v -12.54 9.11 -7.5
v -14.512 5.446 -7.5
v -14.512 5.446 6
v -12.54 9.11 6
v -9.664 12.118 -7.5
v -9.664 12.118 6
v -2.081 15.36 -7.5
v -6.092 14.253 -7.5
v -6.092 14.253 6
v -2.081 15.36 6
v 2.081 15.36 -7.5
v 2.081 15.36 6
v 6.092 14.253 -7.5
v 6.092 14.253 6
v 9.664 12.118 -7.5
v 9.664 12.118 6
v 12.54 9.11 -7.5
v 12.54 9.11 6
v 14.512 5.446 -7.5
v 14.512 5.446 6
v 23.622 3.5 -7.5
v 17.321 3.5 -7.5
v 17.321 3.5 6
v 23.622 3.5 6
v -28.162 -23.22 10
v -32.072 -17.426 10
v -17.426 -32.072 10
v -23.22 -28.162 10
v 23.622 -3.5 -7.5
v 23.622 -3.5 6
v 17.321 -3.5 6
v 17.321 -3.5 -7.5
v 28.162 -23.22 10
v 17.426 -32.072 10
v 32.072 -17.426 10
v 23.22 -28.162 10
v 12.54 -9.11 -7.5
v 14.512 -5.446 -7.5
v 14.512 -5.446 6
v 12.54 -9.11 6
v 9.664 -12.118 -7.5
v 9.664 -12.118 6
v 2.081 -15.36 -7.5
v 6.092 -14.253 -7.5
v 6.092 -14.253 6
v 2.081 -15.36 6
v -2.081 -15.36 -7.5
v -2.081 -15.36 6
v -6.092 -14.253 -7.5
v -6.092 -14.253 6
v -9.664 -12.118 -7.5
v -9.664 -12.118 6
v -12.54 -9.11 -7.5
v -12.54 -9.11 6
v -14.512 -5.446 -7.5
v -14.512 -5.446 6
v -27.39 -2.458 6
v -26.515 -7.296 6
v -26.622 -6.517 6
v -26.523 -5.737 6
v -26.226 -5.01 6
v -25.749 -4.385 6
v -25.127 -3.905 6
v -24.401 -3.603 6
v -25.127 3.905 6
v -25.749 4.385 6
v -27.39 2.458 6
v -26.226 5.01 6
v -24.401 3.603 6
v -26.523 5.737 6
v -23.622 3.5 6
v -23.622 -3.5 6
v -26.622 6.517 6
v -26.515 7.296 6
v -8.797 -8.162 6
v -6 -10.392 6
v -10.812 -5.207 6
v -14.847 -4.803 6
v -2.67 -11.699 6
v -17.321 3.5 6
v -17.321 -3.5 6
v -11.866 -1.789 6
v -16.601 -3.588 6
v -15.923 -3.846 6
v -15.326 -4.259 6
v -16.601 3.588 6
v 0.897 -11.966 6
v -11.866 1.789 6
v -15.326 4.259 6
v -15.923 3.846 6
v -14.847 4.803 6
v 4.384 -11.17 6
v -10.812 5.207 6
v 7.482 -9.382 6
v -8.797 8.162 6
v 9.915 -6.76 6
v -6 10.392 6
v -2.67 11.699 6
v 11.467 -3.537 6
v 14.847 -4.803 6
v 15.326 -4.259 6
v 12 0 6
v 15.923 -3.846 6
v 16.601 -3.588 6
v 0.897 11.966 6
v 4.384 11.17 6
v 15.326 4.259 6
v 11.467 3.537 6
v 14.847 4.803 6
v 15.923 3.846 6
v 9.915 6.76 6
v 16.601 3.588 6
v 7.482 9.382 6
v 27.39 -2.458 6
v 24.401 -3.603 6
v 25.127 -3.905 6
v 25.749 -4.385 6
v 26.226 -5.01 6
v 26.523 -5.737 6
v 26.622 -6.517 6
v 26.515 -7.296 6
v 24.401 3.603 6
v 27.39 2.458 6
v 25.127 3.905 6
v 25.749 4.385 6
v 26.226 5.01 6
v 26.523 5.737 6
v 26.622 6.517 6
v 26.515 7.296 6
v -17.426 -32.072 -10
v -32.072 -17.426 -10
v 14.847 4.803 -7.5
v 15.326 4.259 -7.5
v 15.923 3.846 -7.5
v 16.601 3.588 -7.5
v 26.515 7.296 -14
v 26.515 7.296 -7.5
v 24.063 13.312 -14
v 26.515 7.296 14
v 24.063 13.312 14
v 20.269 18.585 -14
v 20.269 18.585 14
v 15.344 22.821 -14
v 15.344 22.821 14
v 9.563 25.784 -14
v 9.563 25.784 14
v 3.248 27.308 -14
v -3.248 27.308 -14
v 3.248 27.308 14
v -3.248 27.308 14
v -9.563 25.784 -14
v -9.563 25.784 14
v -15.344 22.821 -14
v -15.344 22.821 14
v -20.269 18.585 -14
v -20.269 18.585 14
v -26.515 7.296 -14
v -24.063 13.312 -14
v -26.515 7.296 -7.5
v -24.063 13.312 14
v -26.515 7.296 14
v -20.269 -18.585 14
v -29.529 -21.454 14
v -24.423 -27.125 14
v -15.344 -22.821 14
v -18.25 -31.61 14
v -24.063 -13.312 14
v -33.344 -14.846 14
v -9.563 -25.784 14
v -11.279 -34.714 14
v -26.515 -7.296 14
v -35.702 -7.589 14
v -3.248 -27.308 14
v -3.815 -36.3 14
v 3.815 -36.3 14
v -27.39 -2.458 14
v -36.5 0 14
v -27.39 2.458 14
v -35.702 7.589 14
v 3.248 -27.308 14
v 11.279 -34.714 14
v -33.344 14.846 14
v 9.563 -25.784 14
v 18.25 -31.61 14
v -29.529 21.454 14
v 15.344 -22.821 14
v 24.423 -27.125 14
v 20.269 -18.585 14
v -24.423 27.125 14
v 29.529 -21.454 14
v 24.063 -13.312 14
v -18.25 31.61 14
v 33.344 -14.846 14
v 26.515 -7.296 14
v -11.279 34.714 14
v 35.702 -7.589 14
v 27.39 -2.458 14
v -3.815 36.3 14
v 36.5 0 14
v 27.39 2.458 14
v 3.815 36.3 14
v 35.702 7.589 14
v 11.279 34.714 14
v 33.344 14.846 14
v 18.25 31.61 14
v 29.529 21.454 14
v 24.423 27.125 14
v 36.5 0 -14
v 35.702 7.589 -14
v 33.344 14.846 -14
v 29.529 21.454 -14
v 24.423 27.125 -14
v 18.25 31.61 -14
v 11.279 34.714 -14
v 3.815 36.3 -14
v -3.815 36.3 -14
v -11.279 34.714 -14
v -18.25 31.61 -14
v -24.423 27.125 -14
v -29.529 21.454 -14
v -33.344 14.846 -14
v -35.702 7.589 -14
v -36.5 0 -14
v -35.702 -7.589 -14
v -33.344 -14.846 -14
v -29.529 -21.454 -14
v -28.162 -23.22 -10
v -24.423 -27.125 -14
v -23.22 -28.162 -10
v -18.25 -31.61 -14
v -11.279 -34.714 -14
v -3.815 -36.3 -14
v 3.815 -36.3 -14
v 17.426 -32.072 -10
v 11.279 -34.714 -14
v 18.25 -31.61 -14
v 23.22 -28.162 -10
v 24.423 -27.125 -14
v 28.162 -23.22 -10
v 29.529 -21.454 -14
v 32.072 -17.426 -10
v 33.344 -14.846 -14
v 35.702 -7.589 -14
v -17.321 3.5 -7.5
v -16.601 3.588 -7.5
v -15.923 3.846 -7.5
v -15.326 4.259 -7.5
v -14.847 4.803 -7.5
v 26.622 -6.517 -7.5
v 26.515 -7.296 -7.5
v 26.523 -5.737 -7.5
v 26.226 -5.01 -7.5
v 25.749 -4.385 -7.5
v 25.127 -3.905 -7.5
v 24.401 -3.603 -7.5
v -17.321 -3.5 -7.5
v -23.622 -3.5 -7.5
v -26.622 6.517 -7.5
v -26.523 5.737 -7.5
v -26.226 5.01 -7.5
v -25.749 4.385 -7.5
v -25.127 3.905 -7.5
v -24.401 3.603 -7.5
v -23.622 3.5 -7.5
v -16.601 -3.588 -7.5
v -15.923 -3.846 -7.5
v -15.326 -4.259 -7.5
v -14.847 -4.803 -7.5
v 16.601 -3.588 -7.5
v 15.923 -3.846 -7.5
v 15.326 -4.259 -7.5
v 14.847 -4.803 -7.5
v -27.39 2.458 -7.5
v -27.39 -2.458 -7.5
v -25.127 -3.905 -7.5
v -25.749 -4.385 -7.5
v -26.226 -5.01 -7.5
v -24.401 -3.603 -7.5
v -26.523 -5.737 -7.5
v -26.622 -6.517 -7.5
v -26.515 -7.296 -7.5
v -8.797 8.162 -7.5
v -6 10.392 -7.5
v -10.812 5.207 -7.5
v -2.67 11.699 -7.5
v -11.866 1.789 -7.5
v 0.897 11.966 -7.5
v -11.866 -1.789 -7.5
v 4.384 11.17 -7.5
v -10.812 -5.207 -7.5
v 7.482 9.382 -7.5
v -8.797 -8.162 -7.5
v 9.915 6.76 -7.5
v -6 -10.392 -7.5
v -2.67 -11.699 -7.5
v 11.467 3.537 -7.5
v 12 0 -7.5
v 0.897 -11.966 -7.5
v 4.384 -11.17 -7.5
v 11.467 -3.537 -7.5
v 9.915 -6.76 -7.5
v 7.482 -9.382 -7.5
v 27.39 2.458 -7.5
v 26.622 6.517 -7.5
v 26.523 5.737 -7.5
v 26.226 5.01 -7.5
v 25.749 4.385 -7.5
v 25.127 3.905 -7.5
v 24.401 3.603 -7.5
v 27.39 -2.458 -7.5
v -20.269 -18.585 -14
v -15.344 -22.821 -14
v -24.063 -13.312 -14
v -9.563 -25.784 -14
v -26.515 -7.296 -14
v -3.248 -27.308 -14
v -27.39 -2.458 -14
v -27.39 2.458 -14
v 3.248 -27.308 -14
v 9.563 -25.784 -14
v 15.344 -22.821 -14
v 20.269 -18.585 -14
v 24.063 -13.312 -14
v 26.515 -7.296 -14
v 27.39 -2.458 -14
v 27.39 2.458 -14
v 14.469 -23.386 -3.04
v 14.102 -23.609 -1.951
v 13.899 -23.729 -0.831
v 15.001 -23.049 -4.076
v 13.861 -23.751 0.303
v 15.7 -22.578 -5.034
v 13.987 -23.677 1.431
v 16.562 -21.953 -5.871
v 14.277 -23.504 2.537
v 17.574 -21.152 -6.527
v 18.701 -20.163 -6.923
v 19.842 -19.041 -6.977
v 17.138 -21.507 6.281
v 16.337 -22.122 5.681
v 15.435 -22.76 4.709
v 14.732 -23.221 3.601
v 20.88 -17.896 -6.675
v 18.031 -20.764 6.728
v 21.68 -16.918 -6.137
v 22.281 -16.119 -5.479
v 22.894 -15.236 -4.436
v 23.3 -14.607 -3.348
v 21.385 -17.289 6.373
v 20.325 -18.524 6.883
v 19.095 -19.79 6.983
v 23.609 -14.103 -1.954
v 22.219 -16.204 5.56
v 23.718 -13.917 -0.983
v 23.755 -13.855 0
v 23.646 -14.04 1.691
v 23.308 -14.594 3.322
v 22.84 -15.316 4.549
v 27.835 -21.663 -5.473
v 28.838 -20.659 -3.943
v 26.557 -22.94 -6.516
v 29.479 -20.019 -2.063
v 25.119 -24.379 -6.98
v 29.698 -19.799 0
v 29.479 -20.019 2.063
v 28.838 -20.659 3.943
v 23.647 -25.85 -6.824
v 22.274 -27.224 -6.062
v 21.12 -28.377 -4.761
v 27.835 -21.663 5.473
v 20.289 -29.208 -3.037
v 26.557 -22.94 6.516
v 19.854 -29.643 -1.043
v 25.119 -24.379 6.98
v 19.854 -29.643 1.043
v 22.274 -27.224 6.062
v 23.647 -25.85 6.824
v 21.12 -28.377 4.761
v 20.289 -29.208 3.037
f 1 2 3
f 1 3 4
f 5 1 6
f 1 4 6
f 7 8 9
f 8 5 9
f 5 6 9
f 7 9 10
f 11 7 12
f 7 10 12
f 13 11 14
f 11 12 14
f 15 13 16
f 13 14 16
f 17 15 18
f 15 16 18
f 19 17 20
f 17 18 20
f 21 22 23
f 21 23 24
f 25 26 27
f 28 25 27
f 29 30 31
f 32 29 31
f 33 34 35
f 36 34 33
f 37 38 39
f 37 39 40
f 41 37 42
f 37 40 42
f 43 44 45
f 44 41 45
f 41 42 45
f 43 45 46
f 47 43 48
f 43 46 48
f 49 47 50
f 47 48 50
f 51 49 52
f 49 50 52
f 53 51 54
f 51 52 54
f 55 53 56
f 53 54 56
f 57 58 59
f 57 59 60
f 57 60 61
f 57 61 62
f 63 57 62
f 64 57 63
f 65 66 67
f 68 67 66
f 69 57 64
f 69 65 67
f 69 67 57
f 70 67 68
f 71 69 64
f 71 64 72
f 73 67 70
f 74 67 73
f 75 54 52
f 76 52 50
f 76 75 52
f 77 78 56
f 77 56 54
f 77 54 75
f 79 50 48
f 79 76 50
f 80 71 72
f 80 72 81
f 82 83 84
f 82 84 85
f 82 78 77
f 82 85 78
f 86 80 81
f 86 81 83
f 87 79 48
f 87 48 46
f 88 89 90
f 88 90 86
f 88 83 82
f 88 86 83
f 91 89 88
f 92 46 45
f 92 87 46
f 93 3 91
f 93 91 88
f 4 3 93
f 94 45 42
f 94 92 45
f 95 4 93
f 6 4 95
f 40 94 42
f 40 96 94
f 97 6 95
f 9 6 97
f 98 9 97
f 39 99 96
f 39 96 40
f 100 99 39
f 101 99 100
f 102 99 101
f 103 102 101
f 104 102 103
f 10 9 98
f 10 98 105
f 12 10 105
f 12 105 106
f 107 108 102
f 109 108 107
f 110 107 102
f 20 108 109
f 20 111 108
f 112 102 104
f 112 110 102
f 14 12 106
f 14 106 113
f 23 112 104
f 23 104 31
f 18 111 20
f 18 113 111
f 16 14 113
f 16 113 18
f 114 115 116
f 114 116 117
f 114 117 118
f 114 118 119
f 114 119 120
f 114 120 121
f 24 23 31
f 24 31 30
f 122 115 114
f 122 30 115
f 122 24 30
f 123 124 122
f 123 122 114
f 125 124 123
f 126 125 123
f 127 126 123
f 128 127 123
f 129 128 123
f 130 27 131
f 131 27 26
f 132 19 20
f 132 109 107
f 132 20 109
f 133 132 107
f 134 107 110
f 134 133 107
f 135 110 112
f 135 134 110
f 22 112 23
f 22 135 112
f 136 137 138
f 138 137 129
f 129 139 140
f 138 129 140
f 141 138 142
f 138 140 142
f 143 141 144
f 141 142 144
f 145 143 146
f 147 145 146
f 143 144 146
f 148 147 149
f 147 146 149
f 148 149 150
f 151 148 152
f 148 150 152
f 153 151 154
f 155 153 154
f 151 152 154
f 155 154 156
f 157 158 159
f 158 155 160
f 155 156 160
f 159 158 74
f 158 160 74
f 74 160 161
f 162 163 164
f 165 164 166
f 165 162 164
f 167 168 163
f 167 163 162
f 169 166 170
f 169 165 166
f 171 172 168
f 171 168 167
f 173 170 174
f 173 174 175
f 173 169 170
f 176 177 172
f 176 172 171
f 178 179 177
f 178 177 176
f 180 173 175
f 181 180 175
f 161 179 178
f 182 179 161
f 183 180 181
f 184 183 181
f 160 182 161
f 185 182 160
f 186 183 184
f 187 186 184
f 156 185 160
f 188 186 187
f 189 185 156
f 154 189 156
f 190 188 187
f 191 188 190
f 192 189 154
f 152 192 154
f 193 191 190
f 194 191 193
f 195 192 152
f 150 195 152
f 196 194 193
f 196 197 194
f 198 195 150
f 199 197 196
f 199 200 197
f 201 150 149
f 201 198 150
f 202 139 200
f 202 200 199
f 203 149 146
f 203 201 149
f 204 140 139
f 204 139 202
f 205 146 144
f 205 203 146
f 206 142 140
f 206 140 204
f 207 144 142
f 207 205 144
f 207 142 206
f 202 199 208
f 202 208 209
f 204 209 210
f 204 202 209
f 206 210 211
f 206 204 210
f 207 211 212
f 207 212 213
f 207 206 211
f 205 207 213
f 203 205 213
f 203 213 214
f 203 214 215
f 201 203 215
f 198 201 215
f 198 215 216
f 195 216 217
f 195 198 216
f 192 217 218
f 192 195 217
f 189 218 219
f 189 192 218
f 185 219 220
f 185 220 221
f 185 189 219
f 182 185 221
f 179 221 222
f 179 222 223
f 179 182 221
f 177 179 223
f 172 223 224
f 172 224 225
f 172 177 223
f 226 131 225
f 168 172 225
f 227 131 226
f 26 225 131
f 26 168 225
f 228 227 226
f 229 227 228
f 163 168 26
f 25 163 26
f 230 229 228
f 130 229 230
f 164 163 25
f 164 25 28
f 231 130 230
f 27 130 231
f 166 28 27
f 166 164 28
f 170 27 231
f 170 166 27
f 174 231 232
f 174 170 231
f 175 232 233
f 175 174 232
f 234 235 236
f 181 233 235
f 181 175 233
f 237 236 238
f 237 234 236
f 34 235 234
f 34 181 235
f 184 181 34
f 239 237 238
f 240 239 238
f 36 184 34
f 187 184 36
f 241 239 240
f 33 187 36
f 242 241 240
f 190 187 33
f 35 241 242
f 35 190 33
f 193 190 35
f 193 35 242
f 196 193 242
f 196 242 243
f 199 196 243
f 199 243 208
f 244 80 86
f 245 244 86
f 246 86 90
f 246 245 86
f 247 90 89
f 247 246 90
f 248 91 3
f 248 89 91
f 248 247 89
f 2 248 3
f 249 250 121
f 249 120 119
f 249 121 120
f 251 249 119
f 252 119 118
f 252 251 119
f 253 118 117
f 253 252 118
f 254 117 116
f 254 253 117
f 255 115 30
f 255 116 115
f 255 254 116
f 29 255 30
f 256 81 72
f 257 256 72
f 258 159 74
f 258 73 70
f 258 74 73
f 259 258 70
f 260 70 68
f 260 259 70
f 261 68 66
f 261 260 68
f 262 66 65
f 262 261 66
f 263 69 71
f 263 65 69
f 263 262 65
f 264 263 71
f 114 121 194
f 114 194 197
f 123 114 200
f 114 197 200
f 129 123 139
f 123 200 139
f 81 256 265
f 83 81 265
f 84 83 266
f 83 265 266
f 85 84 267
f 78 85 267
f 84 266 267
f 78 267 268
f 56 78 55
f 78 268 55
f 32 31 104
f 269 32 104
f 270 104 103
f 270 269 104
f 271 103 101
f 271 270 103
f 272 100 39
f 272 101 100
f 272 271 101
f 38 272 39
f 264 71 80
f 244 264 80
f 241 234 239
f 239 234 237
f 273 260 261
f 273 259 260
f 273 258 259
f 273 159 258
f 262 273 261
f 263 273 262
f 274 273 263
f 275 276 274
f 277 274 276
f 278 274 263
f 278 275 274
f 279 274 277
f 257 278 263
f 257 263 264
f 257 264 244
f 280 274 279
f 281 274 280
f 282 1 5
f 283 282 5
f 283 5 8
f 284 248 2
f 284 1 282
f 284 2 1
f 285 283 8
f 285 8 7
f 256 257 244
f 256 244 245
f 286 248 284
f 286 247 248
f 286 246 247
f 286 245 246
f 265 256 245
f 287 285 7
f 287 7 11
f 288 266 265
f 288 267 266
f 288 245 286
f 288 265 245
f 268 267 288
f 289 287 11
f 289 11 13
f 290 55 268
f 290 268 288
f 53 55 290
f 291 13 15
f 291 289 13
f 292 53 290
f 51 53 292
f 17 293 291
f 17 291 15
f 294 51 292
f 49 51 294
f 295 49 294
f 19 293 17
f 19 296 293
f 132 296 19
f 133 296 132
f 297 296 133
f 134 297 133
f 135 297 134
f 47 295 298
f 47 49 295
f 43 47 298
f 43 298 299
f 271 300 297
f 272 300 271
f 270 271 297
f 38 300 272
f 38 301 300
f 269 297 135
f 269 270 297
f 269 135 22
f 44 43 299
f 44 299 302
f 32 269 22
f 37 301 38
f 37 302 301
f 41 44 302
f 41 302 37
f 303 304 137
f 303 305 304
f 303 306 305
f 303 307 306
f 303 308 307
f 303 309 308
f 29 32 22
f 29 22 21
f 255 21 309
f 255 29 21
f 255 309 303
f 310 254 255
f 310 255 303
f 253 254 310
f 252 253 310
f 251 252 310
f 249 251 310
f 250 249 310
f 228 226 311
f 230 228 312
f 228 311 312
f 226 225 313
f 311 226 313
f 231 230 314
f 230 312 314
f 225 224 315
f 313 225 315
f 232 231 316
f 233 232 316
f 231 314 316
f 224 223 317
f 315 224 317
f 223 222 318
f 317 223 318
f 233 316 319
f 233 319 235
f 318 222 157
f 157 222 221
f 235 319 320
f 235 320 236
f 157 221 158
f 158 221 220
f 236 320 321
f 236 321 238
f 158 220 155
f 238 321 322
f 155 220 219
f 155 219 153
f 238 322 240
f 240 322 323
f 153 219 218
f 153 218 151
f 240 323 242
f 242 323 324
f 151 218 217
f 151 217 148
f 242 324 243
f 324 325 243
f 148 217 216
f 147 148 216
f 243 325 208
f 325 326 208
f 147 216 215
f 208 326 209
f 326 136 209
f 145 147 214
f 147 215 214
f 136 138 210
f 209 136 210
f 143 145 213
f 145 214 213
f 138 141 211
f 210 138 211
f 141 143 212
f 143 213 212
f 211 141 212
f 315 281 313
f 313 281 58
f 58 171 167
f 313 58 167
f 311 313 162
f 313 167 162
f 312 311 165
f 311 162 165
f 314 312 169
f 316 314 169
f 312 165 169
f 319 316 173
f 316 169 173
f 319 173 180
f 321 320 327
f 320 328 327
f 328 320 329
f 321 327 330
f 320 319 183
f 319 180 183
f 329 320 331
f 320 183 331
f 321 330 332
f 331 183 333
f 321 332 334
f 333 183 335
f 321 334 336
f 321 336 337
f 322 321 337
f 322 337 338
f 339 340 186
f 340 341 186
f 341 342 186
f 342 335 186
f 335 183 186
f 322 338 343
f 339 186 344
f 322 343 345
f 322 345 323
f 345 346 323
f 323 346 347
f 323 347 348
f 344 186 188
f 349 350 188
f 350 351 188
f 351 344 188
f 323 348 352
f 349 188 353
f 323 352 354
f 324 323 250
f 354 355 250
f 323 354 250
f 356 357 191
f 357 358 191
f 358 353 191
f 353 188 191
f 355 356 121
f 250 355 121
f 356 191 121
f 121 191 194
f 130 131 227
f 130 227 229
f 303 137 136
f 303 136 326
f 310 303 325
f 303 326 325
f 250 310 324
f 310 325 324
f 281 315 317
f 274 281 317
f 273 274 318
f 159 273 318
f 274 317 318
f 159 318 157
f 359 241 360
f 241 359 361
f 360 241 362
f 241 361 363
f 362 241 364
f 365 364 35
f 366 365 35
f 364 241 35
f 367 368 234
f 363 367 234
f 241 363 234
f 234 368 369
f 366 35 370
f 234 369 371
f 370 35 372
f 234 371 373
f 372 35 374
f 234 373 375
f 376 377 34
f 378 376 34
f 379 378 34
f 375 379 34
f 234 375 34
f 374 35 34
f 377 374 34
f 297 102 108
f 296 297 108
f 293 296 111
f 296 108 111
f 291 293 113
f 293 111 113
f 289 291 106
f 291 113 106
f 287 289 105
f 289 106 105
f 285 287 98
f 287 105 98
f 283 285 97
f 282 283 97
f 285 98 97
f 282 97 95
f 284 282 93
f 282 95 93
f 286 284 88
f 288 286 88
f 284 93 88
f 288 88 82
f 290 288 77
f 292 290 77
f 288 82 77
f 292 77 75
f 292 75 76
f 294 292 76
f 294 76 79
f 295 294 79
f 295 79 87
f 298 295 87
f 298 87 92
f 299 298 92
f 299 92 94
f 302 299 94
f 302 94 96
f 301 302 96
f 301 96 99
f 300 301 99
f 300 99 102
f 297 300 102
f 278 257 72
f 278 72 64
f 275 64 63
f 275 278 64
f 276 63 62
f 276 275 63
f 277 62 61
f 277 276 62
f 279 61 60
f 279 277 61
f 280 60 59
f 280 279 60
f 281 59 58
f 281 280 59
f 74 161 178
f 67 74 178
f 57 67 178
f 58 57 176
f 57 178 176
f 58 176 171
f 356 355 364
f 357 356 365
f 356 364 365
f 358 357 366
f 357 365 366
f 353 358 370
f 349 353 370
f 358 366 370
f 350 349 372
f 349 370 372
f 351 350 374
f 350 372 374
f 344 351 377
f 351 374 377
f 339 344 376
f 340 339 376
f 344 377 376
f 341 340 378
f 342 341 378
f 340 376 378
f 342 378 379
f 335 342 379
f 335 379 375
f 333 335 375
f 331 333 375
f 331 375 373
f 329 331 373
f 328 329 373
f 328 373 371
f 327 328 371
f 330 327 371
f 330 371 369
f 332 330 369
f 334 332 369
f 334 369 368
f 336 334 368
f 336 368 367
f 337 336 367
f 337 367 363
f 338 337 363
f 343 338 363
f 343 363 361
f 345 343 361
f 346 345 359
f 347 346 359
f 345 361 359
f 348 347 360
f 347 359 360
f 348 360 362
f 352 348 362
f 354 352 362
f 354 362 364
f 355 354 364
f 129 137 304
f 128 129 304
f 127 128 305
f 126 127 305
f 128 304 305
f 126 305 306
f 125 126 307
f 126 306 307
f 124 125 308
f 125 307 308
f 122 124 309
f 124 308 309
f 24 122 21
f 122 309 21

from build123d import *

# Parameters (mm, degrees)
F0_R      = 36.5
F1_DEPTH  = 14
F2_R      = 12
F3_DEPTH  = 28.001
F4_R      = 3
F5_R      = 27.5
F6_DEPTH  = 8
F7_R      = 27.5
F8_DEPTH  = 6.5
F10_DEPTH = 10
F11_R     = 7
F12_DEPTH = 10


with BuildPart() as f1:
    # F0 (on Top) → F1 (new body, symmetric)
    with BuildSketch(Plane.XY):
        Circle(F0_R)
    extrude(amount=F1_DEPTH, both=True)

    # F2 (on face) → F3 (cut, through all)
    with BuildSketch(Plane.XY.offset(14)):
        with BuildLine():
            Line((-15.0996688705, -3.5), (-27.276363394, -3.5))
            ThreePointArc((-27.276363394, -3.5), (0, -27.5), (27.276363394, -3.5))
            Line((27.276363394, -3.5), (15.0996688705, -3.5))
            ThreePointArc((15.0996688705, -3.5), (0, -15.5), (-15.0996688705, -3.5))
        make_face()
        Circle(F2_R)
        with BuildLine():
            ThreePointArc((27.276363394, 3.5), (0, 27.5), (-27.276363394, 3.5))
            Line((-27.276363394, 3.5), (-15.0996688705, 3.5))
            ThreePointArc((-15.0996688705, 3.5), (0, 15.5), (15.0996688705, 3.5))
            Line((15.0996688705, 3.5), (27.276363394, 3.5))
        make_face()
    extrude(amount=-F3_DEPTH, mode=Mode.SUBTRACT)

    # F4
    f4_edges = [f1.edges().sort_by_distance(p)[0] for p in [
        (-27.276363, 3.5, 0),
        (-15.099669, 3.5, 0),
        (15.099669, 3.5, 0),
        (27.276363, 3.5, 0),
        (27.276363, -3.5, 0),
        (15.099669, -3.5, 0),
        (-15.099669, -3.5, 0),
        (-27.276363, -3.5, 0),
    ]]
    fillet(f4_edges, radius=F4_R)

    # F5 (on face) → F6 (cut)
    with BuildSketch(Plane.XY.offset(14)):
        Circle(F5_R)
    extrude(amount=-F6_DEPTH, mode=Mode.SUBTRACT)

    # F7 (on face) → F8 (cut)
    with BuildSketch(Plane(origin=(0, 0, -14), x_dir=(1, 0, 0), z_dir=(0, 0, -1))):
        Circle(F7_R)
    extrude(amount=-F8_DEPTH, mode=Mode.SUBTRACT)

    # F9 (on Top) → F10 (cut, symmetric)
    with BuildSketch(Plane.XY):
        Polygon((0, -49.4974746831), (-40, -9.4974746831), (-40, -49.4974746831), align=None)
        Polygon((40, -9.4974746831), (0, -49.4974746831), (40, -49.4974746831), align=None)
    extrude(amount=F10_DEPTH, both=True, mode=Mode.SUBTRACT)

    # F11 (on face) → F12 (cut)
    with BuildSketch(Plane(origin=(24.7487373415, -24.7487373415, 0), x_dir=(0.7071067812, 0.7071067812, 0), z_dir=(0.7071067812, -0.7071067812, 0))):
        Circle(F11_R)
    extrude(amount=-F12_DEPTH, mode=Mode.SUBTRACT)


solid = f1.part
